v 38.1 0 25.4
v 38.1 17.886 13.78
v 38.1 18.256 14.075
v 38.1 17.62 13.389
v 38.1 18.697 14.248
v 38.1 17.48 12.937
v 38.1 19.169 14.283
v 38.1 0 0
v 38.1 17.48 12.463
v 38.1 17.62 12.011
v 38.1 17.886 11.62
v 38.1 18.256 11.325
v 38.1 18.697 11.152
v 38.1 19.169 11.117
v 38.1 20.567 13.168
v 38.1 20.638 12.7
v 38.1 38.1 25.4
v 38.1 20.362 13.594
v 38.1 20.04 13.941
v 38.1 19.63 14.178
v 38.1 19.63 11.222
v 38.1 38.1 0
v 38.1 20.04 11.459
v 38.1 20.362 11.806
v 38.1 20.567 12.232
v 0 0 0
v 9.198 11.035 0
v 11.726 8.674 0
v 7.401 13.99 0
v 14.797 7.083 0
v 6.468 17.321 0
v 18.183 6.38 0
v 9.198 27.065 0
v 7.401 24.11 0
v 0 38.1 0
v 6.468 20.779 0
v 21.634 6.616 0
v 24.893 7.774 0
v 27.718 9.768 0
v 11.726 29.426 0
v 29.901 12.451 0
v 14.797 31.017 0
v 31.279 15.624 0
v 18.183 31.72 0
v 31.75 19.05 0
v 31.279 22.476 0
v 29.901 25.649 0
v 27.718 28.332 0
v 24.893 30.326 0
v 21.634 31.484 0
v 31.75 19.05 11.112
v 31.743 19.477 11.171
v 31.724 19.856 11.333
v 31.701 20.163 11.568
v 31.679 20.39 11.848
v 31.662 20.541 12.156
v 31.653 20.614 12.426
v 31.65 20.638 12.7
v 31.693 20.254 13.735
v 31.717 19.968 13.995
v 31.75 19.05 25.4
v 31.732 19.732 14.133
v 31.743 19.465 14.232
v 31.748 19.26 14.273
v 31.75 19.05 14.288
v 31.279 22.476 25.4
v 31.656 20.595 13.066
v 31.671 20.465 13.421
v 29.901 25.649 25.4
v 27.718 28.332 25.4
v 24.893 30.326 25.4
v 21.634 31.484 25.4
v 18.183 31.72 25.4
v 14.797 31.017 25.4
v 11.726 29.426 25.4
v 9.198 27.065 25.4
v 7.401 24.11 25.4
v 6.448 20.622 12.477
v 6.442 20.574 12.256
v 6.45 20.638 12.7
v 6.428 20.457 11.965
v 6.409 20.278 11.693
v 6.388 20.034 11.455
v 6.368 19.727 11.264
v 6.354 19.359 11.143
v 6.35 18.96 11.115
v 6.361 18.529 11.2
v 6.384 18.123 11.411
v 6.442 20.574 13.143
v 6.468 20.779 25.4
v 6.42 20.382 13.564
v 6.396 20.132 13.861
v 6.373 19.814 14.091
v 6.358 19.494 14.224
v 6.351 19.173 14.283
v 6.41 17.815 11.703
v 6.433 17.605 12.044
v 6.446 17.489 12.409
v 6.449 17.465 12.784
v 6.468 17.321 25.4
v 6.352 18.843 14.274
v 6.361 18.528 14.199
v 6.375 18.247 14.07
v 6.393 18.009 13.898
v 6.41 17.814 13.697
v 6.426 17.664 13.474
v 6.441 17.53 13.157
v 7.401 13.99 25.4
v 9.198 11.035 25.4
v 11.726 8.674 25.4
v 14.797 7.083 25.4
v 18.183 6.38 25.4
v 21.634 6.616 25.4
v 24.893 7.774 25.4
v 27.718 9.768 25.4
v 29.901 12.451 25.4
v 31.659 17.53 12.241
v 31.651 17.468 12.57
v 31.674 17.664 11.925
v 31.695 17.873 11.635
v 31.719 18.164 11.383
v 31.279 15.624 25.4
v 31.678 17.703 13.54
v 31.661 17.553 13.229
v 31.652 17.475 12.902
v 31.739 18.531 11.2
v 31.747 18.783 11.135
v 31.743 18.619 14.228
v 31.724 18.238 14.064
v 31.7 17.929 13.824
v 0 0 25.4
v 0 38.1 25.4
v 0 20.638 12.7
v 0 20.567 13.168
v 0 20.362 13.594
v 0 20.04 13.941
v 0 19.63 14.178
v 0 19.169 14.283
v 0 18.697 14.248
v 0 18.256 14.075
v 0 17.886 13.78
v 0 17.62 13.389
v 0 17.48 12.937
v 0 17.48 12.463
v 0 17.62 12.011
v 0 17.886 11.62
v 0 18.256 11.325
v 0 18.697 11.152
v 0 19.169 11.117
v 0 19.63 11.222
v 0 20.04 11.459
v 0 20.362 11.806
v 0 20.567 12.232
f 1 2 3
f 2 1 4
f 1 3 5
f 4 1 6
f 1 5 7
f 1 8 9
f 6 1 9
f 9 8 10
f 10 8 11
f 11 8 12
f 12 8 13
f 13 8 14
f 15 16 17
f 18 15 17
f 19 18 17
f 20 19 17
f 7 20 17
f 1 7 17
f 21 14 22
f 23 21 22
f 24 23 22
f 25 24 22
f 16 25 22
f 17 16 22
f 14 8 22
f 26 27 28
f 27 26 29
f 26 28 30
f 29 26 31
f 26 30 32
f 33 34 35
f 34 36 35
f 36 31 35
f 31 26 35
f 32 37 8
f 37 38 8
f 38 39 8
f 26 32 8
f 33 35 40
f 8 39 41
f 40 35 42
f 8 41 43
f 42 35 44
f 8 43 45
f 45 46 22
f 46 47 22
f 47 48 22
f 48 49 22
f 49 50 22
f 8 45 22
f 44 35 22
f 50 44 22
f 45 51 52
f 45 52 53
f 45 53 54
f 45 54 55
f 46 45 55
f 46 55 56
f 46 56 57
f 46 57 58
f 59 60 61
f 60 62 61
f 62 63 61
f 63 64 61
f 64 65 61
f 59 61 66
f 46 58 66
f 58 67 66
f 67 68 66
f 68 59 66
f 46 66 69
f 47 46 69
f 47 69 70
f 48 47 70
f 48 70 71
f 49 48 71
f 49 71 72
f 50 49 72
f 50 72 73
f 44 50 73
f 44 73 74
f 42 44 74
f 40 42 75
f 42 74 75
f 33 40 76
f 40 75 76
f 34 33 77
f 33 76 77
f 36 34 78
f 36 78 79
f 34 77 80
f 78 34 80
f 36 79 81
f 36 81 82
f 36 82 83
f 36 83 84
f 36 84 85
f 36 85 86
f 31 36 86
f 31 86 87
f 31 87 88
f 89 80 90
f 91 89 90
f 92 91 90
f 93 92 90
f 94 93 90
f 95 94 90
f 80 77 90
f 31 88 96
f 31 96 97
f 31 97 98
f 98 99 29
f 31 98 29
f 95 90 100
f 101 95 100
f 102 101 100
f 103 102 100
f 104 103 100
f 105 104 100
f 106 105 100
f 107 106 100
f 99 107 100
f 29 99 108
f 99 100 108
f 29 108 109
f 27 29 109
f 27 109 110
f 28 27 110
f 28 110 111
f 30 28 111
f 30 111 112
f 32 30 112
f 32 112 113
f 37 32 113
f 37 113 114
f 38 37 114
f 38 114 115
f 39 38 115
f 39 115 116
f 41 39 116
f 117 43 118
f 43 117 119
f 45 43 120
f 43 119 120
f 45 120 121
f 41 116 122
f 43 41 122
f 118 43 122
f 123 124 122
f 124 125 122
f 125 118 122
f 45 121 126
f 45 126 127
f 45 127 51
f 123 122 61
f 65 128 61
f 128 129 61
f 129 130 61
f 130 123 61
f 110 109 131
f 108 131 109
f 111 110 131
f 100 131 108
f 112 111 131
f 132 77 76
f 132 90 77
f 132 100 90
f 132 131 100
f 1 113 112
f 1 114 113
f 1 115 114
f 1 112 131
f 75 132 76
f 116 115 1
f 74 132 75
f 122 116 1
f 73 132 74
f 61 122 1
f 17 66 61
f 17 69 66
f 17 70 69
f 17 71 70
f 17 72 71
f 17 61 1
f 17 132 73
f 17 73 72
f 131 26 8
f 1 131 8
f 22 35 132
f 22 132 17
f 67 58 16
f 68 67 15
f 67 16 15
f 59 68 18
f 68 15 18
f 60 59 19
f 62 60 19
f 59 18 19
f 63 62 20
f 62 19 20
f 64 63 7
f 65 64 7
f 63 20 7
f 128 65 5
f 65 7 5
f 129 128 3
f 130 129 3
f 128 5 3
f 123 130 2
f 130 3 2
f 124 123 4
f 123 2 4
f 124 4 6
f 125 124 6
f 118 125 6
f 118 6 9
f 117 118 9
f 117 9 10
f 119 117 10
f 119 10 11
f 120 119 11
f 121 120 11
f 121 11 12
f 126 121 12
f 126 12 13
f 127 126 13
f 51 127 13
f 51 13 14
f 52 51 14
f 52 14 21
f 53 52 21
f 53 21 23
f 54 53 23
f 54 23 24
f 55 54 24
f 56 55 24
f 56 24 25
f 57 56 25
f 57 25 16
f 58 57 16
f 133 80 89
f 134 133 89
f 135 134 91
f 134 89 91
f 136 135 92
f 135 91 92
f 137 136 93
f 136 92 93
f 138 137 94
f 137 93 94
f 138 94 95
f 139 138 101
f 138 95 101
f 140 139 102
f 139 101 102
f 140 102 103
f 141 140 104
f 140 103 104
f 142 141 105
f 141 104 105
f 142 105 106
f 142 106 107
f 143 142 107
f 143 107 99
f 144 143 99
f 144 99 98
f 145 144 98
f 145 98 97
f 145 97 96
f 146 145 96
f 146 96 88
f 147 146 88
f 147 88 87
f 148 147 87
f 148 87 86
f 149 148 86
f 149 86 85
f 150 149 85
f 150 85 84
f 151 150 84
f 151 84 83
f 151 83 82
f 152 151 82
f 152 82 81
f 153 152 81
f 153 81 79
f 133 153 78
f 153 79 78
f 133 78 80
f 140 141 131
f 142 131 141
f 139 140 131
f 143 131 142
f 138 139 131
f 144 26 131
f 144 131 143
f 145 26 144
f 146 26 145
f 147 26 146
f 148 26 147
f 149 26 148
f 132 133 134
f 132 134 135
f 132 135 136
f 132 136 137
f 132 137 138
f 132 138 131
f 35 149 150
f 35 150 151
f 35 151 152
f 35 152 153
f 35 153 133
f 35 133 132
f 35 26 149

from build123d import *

# Parameters (mm, degrees)
F0_W     = 38.1
F0_H     = 38.1
F1_DEPTH = 25.4
F2_R     = 1.5875
F3_DEPTH = 38.1
F4_R     = 12.7
F5_DEPTH = 25.4


with BuildPart() as f1:
    # F0 (on Top) → F1 (new body)
    with BuildSketch(Plane.XY):
        with Locations((19.05, 19.05)):
            Rectangle(F0_W, F0_H)
    extrude(amount=F1_DEPTH)

    # F2 (on face) → F3 (cut)
    with BuildSketch(Plane.YZ.offset(38.1)):
        with Locations((19.05, 12.7)):
            Circle(F2_R)
    extrude(amount=-F3_DEPTH, mode=Mode.SUBTRACT)

    # F4 (on face) → F5 (cut)
    with BuildSketch(Plane.XY.offset(25.4)):
        with Locations((19.05, 19.05)):
            Circle(F4_R)
    extrude(amount=-F5_DEPTH, mode=Mode.SUBTRACT)


solid = f1.part
